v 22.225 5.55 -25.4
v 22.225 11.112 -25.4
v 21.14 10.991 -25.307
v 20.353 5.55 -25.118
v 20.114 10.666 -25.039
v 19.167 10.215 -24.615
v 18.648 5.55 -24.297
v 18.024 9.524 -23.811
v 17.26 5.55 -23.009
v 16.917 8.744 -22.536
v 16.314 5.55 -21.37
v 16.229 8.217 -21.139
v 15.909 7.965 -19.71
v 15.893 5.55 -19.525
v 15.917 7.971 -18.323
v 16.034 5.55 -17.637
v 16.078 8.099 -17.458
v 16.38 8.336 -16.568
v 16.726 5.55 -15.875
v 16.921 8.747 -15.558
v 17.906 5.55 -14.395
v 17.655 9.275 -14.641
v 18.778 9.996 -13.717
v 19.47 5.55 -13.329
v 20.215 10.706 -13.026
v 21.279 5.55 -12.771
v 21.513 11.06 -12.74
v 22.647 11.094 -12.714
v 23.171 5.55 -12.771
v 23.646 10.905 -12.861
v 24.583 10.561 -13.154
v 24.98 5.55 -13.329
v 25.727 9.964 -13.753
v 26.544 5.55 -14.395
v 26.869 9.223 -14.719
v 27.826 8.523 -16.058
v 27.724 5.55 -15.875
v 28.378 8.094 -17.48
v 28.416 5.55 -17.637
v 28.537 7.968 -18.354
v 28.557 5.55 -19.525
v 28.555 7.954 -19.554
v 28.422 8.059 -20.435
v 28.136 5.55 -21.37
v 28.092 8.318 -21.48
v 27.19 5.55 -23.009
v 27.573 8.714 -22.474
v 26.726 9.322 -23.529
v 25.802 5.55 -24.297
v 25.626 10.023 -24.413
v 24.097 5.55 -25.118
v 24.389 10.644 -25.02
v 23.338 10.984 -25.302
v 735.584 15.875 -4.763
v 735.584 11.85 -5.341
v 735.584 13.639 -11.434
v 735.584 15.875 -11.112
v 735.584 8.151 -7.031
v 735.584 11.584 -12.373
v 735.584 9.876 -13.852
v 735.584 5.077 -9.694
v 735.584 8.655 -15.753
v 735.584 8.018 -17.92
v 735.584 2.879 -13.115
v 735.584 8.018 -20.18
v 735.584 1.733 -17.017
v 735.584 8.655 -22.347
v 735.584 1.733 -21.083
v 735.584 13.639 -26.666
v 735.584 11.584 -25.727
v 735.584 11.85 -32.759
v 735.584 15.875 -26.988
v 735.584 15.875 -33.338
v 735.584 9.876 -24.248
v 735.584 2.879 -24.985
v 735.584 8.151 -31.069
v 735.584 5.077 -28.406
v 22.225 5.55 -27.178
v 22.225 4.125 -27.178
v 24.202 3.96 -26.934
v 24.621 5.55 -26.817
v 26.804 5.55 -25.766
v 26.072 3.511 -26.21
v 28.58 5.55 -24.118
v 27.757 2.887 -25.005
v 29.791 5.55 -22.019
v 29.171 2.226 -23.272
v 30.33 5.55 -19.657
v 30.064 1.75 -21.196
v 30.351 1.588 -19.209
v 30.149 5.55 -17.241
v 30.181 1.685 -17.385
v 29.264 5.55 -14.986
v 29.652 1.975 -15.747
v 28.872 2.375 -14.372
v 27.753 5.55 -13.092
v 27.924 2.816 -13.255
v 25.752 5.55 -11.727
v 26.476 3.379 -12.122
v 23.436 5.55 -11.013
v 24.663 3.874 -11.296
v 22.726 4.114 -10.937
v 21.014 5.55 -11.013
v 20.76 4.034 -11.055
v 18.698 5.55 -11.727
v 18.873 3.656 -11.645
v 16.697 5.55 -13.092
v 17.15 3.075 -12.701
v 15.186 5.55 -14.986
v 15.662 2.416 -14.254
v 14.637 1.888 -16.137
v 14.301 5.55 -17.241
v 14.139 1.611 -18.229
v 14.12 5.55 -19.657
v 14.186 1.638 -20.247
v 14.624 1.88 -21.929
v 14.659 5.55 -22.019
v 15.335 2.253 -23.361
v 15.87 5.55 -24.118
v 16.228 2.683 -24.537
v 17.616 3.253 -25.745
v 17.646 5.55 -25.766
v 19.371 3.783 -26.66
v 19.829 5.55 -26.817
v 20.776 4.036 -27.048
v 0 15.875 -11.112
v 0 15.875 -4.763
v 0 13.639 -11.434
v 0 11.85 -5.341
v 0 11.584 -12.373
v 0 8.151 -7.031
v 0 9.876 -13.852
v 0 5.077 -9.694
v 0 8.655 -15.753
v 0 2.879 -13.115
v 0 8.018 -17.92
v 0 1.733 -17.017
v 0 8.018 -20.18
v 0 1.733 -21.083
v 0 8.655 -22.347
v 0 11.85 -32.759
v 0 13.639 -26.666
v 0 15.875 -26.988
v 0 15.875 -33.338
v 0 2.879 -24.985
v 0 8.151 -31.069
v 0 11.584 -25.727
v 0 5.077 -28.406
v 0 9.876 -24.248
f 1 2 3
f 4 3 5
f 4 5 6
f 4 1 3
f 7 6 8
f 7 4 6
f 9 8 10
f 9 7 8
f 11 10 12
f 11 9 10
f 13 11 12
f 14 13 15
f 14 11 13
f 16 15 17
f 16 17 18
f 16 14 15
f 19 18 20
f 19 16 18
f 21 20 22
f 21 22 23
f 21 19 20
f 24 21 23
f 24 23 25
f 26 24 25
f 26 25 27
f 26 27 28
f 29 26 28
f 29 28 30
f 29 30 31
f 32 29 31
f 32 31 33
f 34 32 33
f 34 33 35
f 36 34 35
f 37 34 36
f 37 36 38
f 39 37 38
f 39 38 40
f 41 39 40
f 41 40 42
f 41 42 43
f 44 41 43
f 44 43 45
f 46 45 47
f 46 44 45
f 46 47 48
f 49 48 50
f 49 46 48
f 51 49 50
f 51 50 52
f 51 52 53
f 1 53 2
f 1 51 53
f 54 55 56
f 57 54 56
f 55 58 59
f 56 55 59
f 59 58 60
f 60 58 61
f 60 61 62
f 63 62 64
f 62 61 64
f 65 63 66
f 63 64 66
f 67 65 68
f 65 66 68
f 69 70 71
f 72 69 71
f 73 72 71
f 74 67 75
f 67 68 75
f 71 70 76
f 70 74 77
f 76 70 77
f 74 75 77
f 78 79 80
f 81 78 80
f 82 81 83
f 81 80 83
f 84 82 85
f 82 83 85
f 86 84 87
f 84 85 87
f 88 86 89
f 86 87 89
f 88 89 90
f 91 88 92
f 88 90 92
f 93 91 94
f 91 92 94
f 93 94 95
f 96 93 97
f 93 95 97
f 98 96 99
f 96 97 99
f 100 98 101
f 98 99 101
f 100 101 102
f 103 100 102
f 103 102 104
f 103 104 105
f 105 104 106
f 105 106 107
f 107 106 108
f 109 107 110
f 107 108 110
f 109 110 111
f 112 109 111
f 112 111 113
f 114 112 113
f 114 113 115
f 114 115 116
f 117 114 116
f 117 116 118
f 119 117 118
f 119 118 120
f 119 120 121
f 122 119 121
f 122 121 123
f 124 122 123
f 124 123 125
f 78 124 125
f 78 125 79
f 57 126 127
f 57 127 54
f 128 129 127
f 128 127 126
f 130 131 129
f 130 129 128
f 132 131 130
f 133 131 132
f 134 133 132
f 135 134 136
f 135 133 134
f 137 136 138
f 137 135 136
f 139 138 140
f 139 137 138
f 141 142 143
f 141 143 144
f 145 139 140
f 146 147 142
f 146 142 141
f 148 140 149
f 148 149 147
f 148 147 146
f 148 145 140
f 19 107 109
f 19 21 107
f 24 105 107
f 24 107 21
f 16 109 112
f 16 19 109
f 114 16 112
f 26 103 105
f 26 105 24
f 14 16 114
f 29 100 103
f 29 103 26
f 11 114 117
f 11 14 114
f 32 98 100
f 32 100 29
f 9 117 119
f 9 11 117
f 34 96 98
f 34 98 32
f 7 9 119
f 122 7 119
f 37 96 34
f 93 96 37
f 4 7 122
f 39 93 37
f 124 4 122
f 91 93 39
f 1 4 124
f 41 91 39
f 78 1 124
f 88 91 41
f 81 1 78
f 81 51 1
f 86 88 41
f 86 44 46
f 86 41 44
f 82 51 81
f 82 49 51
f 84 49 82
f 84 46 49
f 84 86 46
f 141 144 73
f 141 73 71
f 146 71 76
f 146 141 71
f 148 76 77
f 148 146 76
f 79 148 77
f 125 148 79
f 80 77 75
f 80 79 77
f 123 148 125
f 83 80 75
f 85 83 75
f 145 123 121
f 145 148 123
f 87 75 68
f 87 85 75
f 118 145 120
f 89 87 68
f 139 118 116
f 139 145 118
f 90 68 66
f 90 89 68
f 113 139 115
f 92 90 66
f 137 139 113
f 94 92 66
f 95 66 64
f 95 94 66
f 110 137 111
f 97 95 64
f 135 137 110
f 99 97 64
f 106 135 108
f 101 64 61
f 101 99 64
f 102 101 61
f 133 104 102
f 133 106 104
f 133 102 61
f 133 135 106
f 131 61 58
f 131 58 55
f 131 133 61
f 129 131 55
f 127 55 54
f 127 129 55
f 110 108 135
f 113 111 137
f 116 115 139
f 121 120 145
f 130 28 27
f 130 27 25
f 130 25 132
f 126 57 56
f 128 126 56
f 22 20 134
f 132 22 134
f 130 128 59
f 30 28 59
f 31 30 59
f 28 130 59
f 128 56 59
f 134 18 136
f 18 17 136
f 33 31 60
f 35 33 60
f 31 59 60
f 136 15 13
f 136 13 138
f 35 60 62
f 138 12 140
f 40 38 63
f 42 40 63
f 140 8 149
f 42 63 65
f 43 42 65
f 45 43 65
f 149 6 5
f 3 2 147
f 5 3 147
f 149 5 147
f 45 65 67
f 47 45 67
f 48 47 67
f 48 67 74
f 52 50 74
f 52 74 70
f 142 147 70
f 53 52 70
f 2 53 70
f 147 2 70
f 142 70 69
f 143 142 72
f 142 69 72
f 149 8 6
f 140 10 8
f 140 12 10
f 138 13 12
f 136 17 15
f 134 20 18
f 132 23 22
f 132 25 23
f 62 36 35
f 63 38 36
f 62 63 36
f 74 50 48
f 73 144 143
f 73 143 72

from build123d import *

# Parameters (mm, degrees)
SKETCH1_W                     = 735.584
SKETCH1_H                     = 38.1
WOOD_BLOCK_DEPTH              = 15.875
SKETCH2_R                     = 7.9375
INNER_BORE_DEPTH              = 737.741098814
SKETCH3_R                     = 6.35
MOUTHPIECE_THROUGH_HOLE_DEPTH = 737.741098814
SKETCH5_R                     = 8.128
CUT_EXTRUDE3_DEPTH            = 5.5499
SKETCH4_OUTSIDE_W             = 187.448
SKETCH4_OUTSIDE_H             = 165.223
SKETCH4_OUTSIDE_R             = 14.2875
OUTER_DIAMETER_DEPTH          = 737.741098916


with BuildPart() as part:
    # Sketch1 → wood block (new body)
    with BuildSketch(Plane(origin=(0, 0, 0), x_dir=(1, 0, 0), z_dir=(0, 1, 0))):
        with Locations((367.792, 19.05)):
            Rectangle(SKETCH1_W, SKETCH1_H)
    extrude(amount=WOOD_BLOCK_DEPTH)

    # Sketch2 → inner bore (cut, through all)
    with BuildSketch(Plane(origin=(735.584, 0, 0), x_dir=(0, 0, -1), z_dir=(1, 0, 0))):
        with Locations((19.05, 15.875)):
            Circle(SKETCH2_R)
    extrude(amount=-INNER_BORE_DEPTH, mode=Mode.SUBTRACT)

    # Sketch3 → mouthpiece through hole (cut, through all)
    with BuildSketch(Plane(origin=(0, 0, 0), x_dir=(1, 0, 0), z_dir=(0, 1, 0))):
        with Locations(Location((22.225, 19.05, 0), (0, 0, 90))):
            Circle(SKETCH3_R)
    extrude(amount=MOUTHPIECE_THROUGH_HOLE_DEPTH, mode=Mode.SUBTRACT)

    # Sketch5 → Cut-Extrude3 (cut)
    with BuildSketch(Plane.XZ):
        with Locations(Location((22.225, -19.05, 0), (0, 0, 270))):
            Circle(SKETCH5_R)
    extrude(amount=-CUT_EXTRUDE3_DEPTH, mode=Mode.SUBTRACT)

    # Sketch4 outside → outer diameter (cut, through all)
    with BuildSketch(Plane.ZY):
        with Locations((-19.05, 7.9375)):
            Rectangle(SKETCH4_OUTSIDE_W, SKETCH4_OUTSIDE_H)
        with Locations((-19.05, 15.875)):
            Circle(SKETCH4_OUTSIDE_R, mode=Mode.SUBTRACT)
    extrude(amount=-OUTER_DIAMETER_DEPTH, mode=Mode.SUBTRACT)


solid = part.part
